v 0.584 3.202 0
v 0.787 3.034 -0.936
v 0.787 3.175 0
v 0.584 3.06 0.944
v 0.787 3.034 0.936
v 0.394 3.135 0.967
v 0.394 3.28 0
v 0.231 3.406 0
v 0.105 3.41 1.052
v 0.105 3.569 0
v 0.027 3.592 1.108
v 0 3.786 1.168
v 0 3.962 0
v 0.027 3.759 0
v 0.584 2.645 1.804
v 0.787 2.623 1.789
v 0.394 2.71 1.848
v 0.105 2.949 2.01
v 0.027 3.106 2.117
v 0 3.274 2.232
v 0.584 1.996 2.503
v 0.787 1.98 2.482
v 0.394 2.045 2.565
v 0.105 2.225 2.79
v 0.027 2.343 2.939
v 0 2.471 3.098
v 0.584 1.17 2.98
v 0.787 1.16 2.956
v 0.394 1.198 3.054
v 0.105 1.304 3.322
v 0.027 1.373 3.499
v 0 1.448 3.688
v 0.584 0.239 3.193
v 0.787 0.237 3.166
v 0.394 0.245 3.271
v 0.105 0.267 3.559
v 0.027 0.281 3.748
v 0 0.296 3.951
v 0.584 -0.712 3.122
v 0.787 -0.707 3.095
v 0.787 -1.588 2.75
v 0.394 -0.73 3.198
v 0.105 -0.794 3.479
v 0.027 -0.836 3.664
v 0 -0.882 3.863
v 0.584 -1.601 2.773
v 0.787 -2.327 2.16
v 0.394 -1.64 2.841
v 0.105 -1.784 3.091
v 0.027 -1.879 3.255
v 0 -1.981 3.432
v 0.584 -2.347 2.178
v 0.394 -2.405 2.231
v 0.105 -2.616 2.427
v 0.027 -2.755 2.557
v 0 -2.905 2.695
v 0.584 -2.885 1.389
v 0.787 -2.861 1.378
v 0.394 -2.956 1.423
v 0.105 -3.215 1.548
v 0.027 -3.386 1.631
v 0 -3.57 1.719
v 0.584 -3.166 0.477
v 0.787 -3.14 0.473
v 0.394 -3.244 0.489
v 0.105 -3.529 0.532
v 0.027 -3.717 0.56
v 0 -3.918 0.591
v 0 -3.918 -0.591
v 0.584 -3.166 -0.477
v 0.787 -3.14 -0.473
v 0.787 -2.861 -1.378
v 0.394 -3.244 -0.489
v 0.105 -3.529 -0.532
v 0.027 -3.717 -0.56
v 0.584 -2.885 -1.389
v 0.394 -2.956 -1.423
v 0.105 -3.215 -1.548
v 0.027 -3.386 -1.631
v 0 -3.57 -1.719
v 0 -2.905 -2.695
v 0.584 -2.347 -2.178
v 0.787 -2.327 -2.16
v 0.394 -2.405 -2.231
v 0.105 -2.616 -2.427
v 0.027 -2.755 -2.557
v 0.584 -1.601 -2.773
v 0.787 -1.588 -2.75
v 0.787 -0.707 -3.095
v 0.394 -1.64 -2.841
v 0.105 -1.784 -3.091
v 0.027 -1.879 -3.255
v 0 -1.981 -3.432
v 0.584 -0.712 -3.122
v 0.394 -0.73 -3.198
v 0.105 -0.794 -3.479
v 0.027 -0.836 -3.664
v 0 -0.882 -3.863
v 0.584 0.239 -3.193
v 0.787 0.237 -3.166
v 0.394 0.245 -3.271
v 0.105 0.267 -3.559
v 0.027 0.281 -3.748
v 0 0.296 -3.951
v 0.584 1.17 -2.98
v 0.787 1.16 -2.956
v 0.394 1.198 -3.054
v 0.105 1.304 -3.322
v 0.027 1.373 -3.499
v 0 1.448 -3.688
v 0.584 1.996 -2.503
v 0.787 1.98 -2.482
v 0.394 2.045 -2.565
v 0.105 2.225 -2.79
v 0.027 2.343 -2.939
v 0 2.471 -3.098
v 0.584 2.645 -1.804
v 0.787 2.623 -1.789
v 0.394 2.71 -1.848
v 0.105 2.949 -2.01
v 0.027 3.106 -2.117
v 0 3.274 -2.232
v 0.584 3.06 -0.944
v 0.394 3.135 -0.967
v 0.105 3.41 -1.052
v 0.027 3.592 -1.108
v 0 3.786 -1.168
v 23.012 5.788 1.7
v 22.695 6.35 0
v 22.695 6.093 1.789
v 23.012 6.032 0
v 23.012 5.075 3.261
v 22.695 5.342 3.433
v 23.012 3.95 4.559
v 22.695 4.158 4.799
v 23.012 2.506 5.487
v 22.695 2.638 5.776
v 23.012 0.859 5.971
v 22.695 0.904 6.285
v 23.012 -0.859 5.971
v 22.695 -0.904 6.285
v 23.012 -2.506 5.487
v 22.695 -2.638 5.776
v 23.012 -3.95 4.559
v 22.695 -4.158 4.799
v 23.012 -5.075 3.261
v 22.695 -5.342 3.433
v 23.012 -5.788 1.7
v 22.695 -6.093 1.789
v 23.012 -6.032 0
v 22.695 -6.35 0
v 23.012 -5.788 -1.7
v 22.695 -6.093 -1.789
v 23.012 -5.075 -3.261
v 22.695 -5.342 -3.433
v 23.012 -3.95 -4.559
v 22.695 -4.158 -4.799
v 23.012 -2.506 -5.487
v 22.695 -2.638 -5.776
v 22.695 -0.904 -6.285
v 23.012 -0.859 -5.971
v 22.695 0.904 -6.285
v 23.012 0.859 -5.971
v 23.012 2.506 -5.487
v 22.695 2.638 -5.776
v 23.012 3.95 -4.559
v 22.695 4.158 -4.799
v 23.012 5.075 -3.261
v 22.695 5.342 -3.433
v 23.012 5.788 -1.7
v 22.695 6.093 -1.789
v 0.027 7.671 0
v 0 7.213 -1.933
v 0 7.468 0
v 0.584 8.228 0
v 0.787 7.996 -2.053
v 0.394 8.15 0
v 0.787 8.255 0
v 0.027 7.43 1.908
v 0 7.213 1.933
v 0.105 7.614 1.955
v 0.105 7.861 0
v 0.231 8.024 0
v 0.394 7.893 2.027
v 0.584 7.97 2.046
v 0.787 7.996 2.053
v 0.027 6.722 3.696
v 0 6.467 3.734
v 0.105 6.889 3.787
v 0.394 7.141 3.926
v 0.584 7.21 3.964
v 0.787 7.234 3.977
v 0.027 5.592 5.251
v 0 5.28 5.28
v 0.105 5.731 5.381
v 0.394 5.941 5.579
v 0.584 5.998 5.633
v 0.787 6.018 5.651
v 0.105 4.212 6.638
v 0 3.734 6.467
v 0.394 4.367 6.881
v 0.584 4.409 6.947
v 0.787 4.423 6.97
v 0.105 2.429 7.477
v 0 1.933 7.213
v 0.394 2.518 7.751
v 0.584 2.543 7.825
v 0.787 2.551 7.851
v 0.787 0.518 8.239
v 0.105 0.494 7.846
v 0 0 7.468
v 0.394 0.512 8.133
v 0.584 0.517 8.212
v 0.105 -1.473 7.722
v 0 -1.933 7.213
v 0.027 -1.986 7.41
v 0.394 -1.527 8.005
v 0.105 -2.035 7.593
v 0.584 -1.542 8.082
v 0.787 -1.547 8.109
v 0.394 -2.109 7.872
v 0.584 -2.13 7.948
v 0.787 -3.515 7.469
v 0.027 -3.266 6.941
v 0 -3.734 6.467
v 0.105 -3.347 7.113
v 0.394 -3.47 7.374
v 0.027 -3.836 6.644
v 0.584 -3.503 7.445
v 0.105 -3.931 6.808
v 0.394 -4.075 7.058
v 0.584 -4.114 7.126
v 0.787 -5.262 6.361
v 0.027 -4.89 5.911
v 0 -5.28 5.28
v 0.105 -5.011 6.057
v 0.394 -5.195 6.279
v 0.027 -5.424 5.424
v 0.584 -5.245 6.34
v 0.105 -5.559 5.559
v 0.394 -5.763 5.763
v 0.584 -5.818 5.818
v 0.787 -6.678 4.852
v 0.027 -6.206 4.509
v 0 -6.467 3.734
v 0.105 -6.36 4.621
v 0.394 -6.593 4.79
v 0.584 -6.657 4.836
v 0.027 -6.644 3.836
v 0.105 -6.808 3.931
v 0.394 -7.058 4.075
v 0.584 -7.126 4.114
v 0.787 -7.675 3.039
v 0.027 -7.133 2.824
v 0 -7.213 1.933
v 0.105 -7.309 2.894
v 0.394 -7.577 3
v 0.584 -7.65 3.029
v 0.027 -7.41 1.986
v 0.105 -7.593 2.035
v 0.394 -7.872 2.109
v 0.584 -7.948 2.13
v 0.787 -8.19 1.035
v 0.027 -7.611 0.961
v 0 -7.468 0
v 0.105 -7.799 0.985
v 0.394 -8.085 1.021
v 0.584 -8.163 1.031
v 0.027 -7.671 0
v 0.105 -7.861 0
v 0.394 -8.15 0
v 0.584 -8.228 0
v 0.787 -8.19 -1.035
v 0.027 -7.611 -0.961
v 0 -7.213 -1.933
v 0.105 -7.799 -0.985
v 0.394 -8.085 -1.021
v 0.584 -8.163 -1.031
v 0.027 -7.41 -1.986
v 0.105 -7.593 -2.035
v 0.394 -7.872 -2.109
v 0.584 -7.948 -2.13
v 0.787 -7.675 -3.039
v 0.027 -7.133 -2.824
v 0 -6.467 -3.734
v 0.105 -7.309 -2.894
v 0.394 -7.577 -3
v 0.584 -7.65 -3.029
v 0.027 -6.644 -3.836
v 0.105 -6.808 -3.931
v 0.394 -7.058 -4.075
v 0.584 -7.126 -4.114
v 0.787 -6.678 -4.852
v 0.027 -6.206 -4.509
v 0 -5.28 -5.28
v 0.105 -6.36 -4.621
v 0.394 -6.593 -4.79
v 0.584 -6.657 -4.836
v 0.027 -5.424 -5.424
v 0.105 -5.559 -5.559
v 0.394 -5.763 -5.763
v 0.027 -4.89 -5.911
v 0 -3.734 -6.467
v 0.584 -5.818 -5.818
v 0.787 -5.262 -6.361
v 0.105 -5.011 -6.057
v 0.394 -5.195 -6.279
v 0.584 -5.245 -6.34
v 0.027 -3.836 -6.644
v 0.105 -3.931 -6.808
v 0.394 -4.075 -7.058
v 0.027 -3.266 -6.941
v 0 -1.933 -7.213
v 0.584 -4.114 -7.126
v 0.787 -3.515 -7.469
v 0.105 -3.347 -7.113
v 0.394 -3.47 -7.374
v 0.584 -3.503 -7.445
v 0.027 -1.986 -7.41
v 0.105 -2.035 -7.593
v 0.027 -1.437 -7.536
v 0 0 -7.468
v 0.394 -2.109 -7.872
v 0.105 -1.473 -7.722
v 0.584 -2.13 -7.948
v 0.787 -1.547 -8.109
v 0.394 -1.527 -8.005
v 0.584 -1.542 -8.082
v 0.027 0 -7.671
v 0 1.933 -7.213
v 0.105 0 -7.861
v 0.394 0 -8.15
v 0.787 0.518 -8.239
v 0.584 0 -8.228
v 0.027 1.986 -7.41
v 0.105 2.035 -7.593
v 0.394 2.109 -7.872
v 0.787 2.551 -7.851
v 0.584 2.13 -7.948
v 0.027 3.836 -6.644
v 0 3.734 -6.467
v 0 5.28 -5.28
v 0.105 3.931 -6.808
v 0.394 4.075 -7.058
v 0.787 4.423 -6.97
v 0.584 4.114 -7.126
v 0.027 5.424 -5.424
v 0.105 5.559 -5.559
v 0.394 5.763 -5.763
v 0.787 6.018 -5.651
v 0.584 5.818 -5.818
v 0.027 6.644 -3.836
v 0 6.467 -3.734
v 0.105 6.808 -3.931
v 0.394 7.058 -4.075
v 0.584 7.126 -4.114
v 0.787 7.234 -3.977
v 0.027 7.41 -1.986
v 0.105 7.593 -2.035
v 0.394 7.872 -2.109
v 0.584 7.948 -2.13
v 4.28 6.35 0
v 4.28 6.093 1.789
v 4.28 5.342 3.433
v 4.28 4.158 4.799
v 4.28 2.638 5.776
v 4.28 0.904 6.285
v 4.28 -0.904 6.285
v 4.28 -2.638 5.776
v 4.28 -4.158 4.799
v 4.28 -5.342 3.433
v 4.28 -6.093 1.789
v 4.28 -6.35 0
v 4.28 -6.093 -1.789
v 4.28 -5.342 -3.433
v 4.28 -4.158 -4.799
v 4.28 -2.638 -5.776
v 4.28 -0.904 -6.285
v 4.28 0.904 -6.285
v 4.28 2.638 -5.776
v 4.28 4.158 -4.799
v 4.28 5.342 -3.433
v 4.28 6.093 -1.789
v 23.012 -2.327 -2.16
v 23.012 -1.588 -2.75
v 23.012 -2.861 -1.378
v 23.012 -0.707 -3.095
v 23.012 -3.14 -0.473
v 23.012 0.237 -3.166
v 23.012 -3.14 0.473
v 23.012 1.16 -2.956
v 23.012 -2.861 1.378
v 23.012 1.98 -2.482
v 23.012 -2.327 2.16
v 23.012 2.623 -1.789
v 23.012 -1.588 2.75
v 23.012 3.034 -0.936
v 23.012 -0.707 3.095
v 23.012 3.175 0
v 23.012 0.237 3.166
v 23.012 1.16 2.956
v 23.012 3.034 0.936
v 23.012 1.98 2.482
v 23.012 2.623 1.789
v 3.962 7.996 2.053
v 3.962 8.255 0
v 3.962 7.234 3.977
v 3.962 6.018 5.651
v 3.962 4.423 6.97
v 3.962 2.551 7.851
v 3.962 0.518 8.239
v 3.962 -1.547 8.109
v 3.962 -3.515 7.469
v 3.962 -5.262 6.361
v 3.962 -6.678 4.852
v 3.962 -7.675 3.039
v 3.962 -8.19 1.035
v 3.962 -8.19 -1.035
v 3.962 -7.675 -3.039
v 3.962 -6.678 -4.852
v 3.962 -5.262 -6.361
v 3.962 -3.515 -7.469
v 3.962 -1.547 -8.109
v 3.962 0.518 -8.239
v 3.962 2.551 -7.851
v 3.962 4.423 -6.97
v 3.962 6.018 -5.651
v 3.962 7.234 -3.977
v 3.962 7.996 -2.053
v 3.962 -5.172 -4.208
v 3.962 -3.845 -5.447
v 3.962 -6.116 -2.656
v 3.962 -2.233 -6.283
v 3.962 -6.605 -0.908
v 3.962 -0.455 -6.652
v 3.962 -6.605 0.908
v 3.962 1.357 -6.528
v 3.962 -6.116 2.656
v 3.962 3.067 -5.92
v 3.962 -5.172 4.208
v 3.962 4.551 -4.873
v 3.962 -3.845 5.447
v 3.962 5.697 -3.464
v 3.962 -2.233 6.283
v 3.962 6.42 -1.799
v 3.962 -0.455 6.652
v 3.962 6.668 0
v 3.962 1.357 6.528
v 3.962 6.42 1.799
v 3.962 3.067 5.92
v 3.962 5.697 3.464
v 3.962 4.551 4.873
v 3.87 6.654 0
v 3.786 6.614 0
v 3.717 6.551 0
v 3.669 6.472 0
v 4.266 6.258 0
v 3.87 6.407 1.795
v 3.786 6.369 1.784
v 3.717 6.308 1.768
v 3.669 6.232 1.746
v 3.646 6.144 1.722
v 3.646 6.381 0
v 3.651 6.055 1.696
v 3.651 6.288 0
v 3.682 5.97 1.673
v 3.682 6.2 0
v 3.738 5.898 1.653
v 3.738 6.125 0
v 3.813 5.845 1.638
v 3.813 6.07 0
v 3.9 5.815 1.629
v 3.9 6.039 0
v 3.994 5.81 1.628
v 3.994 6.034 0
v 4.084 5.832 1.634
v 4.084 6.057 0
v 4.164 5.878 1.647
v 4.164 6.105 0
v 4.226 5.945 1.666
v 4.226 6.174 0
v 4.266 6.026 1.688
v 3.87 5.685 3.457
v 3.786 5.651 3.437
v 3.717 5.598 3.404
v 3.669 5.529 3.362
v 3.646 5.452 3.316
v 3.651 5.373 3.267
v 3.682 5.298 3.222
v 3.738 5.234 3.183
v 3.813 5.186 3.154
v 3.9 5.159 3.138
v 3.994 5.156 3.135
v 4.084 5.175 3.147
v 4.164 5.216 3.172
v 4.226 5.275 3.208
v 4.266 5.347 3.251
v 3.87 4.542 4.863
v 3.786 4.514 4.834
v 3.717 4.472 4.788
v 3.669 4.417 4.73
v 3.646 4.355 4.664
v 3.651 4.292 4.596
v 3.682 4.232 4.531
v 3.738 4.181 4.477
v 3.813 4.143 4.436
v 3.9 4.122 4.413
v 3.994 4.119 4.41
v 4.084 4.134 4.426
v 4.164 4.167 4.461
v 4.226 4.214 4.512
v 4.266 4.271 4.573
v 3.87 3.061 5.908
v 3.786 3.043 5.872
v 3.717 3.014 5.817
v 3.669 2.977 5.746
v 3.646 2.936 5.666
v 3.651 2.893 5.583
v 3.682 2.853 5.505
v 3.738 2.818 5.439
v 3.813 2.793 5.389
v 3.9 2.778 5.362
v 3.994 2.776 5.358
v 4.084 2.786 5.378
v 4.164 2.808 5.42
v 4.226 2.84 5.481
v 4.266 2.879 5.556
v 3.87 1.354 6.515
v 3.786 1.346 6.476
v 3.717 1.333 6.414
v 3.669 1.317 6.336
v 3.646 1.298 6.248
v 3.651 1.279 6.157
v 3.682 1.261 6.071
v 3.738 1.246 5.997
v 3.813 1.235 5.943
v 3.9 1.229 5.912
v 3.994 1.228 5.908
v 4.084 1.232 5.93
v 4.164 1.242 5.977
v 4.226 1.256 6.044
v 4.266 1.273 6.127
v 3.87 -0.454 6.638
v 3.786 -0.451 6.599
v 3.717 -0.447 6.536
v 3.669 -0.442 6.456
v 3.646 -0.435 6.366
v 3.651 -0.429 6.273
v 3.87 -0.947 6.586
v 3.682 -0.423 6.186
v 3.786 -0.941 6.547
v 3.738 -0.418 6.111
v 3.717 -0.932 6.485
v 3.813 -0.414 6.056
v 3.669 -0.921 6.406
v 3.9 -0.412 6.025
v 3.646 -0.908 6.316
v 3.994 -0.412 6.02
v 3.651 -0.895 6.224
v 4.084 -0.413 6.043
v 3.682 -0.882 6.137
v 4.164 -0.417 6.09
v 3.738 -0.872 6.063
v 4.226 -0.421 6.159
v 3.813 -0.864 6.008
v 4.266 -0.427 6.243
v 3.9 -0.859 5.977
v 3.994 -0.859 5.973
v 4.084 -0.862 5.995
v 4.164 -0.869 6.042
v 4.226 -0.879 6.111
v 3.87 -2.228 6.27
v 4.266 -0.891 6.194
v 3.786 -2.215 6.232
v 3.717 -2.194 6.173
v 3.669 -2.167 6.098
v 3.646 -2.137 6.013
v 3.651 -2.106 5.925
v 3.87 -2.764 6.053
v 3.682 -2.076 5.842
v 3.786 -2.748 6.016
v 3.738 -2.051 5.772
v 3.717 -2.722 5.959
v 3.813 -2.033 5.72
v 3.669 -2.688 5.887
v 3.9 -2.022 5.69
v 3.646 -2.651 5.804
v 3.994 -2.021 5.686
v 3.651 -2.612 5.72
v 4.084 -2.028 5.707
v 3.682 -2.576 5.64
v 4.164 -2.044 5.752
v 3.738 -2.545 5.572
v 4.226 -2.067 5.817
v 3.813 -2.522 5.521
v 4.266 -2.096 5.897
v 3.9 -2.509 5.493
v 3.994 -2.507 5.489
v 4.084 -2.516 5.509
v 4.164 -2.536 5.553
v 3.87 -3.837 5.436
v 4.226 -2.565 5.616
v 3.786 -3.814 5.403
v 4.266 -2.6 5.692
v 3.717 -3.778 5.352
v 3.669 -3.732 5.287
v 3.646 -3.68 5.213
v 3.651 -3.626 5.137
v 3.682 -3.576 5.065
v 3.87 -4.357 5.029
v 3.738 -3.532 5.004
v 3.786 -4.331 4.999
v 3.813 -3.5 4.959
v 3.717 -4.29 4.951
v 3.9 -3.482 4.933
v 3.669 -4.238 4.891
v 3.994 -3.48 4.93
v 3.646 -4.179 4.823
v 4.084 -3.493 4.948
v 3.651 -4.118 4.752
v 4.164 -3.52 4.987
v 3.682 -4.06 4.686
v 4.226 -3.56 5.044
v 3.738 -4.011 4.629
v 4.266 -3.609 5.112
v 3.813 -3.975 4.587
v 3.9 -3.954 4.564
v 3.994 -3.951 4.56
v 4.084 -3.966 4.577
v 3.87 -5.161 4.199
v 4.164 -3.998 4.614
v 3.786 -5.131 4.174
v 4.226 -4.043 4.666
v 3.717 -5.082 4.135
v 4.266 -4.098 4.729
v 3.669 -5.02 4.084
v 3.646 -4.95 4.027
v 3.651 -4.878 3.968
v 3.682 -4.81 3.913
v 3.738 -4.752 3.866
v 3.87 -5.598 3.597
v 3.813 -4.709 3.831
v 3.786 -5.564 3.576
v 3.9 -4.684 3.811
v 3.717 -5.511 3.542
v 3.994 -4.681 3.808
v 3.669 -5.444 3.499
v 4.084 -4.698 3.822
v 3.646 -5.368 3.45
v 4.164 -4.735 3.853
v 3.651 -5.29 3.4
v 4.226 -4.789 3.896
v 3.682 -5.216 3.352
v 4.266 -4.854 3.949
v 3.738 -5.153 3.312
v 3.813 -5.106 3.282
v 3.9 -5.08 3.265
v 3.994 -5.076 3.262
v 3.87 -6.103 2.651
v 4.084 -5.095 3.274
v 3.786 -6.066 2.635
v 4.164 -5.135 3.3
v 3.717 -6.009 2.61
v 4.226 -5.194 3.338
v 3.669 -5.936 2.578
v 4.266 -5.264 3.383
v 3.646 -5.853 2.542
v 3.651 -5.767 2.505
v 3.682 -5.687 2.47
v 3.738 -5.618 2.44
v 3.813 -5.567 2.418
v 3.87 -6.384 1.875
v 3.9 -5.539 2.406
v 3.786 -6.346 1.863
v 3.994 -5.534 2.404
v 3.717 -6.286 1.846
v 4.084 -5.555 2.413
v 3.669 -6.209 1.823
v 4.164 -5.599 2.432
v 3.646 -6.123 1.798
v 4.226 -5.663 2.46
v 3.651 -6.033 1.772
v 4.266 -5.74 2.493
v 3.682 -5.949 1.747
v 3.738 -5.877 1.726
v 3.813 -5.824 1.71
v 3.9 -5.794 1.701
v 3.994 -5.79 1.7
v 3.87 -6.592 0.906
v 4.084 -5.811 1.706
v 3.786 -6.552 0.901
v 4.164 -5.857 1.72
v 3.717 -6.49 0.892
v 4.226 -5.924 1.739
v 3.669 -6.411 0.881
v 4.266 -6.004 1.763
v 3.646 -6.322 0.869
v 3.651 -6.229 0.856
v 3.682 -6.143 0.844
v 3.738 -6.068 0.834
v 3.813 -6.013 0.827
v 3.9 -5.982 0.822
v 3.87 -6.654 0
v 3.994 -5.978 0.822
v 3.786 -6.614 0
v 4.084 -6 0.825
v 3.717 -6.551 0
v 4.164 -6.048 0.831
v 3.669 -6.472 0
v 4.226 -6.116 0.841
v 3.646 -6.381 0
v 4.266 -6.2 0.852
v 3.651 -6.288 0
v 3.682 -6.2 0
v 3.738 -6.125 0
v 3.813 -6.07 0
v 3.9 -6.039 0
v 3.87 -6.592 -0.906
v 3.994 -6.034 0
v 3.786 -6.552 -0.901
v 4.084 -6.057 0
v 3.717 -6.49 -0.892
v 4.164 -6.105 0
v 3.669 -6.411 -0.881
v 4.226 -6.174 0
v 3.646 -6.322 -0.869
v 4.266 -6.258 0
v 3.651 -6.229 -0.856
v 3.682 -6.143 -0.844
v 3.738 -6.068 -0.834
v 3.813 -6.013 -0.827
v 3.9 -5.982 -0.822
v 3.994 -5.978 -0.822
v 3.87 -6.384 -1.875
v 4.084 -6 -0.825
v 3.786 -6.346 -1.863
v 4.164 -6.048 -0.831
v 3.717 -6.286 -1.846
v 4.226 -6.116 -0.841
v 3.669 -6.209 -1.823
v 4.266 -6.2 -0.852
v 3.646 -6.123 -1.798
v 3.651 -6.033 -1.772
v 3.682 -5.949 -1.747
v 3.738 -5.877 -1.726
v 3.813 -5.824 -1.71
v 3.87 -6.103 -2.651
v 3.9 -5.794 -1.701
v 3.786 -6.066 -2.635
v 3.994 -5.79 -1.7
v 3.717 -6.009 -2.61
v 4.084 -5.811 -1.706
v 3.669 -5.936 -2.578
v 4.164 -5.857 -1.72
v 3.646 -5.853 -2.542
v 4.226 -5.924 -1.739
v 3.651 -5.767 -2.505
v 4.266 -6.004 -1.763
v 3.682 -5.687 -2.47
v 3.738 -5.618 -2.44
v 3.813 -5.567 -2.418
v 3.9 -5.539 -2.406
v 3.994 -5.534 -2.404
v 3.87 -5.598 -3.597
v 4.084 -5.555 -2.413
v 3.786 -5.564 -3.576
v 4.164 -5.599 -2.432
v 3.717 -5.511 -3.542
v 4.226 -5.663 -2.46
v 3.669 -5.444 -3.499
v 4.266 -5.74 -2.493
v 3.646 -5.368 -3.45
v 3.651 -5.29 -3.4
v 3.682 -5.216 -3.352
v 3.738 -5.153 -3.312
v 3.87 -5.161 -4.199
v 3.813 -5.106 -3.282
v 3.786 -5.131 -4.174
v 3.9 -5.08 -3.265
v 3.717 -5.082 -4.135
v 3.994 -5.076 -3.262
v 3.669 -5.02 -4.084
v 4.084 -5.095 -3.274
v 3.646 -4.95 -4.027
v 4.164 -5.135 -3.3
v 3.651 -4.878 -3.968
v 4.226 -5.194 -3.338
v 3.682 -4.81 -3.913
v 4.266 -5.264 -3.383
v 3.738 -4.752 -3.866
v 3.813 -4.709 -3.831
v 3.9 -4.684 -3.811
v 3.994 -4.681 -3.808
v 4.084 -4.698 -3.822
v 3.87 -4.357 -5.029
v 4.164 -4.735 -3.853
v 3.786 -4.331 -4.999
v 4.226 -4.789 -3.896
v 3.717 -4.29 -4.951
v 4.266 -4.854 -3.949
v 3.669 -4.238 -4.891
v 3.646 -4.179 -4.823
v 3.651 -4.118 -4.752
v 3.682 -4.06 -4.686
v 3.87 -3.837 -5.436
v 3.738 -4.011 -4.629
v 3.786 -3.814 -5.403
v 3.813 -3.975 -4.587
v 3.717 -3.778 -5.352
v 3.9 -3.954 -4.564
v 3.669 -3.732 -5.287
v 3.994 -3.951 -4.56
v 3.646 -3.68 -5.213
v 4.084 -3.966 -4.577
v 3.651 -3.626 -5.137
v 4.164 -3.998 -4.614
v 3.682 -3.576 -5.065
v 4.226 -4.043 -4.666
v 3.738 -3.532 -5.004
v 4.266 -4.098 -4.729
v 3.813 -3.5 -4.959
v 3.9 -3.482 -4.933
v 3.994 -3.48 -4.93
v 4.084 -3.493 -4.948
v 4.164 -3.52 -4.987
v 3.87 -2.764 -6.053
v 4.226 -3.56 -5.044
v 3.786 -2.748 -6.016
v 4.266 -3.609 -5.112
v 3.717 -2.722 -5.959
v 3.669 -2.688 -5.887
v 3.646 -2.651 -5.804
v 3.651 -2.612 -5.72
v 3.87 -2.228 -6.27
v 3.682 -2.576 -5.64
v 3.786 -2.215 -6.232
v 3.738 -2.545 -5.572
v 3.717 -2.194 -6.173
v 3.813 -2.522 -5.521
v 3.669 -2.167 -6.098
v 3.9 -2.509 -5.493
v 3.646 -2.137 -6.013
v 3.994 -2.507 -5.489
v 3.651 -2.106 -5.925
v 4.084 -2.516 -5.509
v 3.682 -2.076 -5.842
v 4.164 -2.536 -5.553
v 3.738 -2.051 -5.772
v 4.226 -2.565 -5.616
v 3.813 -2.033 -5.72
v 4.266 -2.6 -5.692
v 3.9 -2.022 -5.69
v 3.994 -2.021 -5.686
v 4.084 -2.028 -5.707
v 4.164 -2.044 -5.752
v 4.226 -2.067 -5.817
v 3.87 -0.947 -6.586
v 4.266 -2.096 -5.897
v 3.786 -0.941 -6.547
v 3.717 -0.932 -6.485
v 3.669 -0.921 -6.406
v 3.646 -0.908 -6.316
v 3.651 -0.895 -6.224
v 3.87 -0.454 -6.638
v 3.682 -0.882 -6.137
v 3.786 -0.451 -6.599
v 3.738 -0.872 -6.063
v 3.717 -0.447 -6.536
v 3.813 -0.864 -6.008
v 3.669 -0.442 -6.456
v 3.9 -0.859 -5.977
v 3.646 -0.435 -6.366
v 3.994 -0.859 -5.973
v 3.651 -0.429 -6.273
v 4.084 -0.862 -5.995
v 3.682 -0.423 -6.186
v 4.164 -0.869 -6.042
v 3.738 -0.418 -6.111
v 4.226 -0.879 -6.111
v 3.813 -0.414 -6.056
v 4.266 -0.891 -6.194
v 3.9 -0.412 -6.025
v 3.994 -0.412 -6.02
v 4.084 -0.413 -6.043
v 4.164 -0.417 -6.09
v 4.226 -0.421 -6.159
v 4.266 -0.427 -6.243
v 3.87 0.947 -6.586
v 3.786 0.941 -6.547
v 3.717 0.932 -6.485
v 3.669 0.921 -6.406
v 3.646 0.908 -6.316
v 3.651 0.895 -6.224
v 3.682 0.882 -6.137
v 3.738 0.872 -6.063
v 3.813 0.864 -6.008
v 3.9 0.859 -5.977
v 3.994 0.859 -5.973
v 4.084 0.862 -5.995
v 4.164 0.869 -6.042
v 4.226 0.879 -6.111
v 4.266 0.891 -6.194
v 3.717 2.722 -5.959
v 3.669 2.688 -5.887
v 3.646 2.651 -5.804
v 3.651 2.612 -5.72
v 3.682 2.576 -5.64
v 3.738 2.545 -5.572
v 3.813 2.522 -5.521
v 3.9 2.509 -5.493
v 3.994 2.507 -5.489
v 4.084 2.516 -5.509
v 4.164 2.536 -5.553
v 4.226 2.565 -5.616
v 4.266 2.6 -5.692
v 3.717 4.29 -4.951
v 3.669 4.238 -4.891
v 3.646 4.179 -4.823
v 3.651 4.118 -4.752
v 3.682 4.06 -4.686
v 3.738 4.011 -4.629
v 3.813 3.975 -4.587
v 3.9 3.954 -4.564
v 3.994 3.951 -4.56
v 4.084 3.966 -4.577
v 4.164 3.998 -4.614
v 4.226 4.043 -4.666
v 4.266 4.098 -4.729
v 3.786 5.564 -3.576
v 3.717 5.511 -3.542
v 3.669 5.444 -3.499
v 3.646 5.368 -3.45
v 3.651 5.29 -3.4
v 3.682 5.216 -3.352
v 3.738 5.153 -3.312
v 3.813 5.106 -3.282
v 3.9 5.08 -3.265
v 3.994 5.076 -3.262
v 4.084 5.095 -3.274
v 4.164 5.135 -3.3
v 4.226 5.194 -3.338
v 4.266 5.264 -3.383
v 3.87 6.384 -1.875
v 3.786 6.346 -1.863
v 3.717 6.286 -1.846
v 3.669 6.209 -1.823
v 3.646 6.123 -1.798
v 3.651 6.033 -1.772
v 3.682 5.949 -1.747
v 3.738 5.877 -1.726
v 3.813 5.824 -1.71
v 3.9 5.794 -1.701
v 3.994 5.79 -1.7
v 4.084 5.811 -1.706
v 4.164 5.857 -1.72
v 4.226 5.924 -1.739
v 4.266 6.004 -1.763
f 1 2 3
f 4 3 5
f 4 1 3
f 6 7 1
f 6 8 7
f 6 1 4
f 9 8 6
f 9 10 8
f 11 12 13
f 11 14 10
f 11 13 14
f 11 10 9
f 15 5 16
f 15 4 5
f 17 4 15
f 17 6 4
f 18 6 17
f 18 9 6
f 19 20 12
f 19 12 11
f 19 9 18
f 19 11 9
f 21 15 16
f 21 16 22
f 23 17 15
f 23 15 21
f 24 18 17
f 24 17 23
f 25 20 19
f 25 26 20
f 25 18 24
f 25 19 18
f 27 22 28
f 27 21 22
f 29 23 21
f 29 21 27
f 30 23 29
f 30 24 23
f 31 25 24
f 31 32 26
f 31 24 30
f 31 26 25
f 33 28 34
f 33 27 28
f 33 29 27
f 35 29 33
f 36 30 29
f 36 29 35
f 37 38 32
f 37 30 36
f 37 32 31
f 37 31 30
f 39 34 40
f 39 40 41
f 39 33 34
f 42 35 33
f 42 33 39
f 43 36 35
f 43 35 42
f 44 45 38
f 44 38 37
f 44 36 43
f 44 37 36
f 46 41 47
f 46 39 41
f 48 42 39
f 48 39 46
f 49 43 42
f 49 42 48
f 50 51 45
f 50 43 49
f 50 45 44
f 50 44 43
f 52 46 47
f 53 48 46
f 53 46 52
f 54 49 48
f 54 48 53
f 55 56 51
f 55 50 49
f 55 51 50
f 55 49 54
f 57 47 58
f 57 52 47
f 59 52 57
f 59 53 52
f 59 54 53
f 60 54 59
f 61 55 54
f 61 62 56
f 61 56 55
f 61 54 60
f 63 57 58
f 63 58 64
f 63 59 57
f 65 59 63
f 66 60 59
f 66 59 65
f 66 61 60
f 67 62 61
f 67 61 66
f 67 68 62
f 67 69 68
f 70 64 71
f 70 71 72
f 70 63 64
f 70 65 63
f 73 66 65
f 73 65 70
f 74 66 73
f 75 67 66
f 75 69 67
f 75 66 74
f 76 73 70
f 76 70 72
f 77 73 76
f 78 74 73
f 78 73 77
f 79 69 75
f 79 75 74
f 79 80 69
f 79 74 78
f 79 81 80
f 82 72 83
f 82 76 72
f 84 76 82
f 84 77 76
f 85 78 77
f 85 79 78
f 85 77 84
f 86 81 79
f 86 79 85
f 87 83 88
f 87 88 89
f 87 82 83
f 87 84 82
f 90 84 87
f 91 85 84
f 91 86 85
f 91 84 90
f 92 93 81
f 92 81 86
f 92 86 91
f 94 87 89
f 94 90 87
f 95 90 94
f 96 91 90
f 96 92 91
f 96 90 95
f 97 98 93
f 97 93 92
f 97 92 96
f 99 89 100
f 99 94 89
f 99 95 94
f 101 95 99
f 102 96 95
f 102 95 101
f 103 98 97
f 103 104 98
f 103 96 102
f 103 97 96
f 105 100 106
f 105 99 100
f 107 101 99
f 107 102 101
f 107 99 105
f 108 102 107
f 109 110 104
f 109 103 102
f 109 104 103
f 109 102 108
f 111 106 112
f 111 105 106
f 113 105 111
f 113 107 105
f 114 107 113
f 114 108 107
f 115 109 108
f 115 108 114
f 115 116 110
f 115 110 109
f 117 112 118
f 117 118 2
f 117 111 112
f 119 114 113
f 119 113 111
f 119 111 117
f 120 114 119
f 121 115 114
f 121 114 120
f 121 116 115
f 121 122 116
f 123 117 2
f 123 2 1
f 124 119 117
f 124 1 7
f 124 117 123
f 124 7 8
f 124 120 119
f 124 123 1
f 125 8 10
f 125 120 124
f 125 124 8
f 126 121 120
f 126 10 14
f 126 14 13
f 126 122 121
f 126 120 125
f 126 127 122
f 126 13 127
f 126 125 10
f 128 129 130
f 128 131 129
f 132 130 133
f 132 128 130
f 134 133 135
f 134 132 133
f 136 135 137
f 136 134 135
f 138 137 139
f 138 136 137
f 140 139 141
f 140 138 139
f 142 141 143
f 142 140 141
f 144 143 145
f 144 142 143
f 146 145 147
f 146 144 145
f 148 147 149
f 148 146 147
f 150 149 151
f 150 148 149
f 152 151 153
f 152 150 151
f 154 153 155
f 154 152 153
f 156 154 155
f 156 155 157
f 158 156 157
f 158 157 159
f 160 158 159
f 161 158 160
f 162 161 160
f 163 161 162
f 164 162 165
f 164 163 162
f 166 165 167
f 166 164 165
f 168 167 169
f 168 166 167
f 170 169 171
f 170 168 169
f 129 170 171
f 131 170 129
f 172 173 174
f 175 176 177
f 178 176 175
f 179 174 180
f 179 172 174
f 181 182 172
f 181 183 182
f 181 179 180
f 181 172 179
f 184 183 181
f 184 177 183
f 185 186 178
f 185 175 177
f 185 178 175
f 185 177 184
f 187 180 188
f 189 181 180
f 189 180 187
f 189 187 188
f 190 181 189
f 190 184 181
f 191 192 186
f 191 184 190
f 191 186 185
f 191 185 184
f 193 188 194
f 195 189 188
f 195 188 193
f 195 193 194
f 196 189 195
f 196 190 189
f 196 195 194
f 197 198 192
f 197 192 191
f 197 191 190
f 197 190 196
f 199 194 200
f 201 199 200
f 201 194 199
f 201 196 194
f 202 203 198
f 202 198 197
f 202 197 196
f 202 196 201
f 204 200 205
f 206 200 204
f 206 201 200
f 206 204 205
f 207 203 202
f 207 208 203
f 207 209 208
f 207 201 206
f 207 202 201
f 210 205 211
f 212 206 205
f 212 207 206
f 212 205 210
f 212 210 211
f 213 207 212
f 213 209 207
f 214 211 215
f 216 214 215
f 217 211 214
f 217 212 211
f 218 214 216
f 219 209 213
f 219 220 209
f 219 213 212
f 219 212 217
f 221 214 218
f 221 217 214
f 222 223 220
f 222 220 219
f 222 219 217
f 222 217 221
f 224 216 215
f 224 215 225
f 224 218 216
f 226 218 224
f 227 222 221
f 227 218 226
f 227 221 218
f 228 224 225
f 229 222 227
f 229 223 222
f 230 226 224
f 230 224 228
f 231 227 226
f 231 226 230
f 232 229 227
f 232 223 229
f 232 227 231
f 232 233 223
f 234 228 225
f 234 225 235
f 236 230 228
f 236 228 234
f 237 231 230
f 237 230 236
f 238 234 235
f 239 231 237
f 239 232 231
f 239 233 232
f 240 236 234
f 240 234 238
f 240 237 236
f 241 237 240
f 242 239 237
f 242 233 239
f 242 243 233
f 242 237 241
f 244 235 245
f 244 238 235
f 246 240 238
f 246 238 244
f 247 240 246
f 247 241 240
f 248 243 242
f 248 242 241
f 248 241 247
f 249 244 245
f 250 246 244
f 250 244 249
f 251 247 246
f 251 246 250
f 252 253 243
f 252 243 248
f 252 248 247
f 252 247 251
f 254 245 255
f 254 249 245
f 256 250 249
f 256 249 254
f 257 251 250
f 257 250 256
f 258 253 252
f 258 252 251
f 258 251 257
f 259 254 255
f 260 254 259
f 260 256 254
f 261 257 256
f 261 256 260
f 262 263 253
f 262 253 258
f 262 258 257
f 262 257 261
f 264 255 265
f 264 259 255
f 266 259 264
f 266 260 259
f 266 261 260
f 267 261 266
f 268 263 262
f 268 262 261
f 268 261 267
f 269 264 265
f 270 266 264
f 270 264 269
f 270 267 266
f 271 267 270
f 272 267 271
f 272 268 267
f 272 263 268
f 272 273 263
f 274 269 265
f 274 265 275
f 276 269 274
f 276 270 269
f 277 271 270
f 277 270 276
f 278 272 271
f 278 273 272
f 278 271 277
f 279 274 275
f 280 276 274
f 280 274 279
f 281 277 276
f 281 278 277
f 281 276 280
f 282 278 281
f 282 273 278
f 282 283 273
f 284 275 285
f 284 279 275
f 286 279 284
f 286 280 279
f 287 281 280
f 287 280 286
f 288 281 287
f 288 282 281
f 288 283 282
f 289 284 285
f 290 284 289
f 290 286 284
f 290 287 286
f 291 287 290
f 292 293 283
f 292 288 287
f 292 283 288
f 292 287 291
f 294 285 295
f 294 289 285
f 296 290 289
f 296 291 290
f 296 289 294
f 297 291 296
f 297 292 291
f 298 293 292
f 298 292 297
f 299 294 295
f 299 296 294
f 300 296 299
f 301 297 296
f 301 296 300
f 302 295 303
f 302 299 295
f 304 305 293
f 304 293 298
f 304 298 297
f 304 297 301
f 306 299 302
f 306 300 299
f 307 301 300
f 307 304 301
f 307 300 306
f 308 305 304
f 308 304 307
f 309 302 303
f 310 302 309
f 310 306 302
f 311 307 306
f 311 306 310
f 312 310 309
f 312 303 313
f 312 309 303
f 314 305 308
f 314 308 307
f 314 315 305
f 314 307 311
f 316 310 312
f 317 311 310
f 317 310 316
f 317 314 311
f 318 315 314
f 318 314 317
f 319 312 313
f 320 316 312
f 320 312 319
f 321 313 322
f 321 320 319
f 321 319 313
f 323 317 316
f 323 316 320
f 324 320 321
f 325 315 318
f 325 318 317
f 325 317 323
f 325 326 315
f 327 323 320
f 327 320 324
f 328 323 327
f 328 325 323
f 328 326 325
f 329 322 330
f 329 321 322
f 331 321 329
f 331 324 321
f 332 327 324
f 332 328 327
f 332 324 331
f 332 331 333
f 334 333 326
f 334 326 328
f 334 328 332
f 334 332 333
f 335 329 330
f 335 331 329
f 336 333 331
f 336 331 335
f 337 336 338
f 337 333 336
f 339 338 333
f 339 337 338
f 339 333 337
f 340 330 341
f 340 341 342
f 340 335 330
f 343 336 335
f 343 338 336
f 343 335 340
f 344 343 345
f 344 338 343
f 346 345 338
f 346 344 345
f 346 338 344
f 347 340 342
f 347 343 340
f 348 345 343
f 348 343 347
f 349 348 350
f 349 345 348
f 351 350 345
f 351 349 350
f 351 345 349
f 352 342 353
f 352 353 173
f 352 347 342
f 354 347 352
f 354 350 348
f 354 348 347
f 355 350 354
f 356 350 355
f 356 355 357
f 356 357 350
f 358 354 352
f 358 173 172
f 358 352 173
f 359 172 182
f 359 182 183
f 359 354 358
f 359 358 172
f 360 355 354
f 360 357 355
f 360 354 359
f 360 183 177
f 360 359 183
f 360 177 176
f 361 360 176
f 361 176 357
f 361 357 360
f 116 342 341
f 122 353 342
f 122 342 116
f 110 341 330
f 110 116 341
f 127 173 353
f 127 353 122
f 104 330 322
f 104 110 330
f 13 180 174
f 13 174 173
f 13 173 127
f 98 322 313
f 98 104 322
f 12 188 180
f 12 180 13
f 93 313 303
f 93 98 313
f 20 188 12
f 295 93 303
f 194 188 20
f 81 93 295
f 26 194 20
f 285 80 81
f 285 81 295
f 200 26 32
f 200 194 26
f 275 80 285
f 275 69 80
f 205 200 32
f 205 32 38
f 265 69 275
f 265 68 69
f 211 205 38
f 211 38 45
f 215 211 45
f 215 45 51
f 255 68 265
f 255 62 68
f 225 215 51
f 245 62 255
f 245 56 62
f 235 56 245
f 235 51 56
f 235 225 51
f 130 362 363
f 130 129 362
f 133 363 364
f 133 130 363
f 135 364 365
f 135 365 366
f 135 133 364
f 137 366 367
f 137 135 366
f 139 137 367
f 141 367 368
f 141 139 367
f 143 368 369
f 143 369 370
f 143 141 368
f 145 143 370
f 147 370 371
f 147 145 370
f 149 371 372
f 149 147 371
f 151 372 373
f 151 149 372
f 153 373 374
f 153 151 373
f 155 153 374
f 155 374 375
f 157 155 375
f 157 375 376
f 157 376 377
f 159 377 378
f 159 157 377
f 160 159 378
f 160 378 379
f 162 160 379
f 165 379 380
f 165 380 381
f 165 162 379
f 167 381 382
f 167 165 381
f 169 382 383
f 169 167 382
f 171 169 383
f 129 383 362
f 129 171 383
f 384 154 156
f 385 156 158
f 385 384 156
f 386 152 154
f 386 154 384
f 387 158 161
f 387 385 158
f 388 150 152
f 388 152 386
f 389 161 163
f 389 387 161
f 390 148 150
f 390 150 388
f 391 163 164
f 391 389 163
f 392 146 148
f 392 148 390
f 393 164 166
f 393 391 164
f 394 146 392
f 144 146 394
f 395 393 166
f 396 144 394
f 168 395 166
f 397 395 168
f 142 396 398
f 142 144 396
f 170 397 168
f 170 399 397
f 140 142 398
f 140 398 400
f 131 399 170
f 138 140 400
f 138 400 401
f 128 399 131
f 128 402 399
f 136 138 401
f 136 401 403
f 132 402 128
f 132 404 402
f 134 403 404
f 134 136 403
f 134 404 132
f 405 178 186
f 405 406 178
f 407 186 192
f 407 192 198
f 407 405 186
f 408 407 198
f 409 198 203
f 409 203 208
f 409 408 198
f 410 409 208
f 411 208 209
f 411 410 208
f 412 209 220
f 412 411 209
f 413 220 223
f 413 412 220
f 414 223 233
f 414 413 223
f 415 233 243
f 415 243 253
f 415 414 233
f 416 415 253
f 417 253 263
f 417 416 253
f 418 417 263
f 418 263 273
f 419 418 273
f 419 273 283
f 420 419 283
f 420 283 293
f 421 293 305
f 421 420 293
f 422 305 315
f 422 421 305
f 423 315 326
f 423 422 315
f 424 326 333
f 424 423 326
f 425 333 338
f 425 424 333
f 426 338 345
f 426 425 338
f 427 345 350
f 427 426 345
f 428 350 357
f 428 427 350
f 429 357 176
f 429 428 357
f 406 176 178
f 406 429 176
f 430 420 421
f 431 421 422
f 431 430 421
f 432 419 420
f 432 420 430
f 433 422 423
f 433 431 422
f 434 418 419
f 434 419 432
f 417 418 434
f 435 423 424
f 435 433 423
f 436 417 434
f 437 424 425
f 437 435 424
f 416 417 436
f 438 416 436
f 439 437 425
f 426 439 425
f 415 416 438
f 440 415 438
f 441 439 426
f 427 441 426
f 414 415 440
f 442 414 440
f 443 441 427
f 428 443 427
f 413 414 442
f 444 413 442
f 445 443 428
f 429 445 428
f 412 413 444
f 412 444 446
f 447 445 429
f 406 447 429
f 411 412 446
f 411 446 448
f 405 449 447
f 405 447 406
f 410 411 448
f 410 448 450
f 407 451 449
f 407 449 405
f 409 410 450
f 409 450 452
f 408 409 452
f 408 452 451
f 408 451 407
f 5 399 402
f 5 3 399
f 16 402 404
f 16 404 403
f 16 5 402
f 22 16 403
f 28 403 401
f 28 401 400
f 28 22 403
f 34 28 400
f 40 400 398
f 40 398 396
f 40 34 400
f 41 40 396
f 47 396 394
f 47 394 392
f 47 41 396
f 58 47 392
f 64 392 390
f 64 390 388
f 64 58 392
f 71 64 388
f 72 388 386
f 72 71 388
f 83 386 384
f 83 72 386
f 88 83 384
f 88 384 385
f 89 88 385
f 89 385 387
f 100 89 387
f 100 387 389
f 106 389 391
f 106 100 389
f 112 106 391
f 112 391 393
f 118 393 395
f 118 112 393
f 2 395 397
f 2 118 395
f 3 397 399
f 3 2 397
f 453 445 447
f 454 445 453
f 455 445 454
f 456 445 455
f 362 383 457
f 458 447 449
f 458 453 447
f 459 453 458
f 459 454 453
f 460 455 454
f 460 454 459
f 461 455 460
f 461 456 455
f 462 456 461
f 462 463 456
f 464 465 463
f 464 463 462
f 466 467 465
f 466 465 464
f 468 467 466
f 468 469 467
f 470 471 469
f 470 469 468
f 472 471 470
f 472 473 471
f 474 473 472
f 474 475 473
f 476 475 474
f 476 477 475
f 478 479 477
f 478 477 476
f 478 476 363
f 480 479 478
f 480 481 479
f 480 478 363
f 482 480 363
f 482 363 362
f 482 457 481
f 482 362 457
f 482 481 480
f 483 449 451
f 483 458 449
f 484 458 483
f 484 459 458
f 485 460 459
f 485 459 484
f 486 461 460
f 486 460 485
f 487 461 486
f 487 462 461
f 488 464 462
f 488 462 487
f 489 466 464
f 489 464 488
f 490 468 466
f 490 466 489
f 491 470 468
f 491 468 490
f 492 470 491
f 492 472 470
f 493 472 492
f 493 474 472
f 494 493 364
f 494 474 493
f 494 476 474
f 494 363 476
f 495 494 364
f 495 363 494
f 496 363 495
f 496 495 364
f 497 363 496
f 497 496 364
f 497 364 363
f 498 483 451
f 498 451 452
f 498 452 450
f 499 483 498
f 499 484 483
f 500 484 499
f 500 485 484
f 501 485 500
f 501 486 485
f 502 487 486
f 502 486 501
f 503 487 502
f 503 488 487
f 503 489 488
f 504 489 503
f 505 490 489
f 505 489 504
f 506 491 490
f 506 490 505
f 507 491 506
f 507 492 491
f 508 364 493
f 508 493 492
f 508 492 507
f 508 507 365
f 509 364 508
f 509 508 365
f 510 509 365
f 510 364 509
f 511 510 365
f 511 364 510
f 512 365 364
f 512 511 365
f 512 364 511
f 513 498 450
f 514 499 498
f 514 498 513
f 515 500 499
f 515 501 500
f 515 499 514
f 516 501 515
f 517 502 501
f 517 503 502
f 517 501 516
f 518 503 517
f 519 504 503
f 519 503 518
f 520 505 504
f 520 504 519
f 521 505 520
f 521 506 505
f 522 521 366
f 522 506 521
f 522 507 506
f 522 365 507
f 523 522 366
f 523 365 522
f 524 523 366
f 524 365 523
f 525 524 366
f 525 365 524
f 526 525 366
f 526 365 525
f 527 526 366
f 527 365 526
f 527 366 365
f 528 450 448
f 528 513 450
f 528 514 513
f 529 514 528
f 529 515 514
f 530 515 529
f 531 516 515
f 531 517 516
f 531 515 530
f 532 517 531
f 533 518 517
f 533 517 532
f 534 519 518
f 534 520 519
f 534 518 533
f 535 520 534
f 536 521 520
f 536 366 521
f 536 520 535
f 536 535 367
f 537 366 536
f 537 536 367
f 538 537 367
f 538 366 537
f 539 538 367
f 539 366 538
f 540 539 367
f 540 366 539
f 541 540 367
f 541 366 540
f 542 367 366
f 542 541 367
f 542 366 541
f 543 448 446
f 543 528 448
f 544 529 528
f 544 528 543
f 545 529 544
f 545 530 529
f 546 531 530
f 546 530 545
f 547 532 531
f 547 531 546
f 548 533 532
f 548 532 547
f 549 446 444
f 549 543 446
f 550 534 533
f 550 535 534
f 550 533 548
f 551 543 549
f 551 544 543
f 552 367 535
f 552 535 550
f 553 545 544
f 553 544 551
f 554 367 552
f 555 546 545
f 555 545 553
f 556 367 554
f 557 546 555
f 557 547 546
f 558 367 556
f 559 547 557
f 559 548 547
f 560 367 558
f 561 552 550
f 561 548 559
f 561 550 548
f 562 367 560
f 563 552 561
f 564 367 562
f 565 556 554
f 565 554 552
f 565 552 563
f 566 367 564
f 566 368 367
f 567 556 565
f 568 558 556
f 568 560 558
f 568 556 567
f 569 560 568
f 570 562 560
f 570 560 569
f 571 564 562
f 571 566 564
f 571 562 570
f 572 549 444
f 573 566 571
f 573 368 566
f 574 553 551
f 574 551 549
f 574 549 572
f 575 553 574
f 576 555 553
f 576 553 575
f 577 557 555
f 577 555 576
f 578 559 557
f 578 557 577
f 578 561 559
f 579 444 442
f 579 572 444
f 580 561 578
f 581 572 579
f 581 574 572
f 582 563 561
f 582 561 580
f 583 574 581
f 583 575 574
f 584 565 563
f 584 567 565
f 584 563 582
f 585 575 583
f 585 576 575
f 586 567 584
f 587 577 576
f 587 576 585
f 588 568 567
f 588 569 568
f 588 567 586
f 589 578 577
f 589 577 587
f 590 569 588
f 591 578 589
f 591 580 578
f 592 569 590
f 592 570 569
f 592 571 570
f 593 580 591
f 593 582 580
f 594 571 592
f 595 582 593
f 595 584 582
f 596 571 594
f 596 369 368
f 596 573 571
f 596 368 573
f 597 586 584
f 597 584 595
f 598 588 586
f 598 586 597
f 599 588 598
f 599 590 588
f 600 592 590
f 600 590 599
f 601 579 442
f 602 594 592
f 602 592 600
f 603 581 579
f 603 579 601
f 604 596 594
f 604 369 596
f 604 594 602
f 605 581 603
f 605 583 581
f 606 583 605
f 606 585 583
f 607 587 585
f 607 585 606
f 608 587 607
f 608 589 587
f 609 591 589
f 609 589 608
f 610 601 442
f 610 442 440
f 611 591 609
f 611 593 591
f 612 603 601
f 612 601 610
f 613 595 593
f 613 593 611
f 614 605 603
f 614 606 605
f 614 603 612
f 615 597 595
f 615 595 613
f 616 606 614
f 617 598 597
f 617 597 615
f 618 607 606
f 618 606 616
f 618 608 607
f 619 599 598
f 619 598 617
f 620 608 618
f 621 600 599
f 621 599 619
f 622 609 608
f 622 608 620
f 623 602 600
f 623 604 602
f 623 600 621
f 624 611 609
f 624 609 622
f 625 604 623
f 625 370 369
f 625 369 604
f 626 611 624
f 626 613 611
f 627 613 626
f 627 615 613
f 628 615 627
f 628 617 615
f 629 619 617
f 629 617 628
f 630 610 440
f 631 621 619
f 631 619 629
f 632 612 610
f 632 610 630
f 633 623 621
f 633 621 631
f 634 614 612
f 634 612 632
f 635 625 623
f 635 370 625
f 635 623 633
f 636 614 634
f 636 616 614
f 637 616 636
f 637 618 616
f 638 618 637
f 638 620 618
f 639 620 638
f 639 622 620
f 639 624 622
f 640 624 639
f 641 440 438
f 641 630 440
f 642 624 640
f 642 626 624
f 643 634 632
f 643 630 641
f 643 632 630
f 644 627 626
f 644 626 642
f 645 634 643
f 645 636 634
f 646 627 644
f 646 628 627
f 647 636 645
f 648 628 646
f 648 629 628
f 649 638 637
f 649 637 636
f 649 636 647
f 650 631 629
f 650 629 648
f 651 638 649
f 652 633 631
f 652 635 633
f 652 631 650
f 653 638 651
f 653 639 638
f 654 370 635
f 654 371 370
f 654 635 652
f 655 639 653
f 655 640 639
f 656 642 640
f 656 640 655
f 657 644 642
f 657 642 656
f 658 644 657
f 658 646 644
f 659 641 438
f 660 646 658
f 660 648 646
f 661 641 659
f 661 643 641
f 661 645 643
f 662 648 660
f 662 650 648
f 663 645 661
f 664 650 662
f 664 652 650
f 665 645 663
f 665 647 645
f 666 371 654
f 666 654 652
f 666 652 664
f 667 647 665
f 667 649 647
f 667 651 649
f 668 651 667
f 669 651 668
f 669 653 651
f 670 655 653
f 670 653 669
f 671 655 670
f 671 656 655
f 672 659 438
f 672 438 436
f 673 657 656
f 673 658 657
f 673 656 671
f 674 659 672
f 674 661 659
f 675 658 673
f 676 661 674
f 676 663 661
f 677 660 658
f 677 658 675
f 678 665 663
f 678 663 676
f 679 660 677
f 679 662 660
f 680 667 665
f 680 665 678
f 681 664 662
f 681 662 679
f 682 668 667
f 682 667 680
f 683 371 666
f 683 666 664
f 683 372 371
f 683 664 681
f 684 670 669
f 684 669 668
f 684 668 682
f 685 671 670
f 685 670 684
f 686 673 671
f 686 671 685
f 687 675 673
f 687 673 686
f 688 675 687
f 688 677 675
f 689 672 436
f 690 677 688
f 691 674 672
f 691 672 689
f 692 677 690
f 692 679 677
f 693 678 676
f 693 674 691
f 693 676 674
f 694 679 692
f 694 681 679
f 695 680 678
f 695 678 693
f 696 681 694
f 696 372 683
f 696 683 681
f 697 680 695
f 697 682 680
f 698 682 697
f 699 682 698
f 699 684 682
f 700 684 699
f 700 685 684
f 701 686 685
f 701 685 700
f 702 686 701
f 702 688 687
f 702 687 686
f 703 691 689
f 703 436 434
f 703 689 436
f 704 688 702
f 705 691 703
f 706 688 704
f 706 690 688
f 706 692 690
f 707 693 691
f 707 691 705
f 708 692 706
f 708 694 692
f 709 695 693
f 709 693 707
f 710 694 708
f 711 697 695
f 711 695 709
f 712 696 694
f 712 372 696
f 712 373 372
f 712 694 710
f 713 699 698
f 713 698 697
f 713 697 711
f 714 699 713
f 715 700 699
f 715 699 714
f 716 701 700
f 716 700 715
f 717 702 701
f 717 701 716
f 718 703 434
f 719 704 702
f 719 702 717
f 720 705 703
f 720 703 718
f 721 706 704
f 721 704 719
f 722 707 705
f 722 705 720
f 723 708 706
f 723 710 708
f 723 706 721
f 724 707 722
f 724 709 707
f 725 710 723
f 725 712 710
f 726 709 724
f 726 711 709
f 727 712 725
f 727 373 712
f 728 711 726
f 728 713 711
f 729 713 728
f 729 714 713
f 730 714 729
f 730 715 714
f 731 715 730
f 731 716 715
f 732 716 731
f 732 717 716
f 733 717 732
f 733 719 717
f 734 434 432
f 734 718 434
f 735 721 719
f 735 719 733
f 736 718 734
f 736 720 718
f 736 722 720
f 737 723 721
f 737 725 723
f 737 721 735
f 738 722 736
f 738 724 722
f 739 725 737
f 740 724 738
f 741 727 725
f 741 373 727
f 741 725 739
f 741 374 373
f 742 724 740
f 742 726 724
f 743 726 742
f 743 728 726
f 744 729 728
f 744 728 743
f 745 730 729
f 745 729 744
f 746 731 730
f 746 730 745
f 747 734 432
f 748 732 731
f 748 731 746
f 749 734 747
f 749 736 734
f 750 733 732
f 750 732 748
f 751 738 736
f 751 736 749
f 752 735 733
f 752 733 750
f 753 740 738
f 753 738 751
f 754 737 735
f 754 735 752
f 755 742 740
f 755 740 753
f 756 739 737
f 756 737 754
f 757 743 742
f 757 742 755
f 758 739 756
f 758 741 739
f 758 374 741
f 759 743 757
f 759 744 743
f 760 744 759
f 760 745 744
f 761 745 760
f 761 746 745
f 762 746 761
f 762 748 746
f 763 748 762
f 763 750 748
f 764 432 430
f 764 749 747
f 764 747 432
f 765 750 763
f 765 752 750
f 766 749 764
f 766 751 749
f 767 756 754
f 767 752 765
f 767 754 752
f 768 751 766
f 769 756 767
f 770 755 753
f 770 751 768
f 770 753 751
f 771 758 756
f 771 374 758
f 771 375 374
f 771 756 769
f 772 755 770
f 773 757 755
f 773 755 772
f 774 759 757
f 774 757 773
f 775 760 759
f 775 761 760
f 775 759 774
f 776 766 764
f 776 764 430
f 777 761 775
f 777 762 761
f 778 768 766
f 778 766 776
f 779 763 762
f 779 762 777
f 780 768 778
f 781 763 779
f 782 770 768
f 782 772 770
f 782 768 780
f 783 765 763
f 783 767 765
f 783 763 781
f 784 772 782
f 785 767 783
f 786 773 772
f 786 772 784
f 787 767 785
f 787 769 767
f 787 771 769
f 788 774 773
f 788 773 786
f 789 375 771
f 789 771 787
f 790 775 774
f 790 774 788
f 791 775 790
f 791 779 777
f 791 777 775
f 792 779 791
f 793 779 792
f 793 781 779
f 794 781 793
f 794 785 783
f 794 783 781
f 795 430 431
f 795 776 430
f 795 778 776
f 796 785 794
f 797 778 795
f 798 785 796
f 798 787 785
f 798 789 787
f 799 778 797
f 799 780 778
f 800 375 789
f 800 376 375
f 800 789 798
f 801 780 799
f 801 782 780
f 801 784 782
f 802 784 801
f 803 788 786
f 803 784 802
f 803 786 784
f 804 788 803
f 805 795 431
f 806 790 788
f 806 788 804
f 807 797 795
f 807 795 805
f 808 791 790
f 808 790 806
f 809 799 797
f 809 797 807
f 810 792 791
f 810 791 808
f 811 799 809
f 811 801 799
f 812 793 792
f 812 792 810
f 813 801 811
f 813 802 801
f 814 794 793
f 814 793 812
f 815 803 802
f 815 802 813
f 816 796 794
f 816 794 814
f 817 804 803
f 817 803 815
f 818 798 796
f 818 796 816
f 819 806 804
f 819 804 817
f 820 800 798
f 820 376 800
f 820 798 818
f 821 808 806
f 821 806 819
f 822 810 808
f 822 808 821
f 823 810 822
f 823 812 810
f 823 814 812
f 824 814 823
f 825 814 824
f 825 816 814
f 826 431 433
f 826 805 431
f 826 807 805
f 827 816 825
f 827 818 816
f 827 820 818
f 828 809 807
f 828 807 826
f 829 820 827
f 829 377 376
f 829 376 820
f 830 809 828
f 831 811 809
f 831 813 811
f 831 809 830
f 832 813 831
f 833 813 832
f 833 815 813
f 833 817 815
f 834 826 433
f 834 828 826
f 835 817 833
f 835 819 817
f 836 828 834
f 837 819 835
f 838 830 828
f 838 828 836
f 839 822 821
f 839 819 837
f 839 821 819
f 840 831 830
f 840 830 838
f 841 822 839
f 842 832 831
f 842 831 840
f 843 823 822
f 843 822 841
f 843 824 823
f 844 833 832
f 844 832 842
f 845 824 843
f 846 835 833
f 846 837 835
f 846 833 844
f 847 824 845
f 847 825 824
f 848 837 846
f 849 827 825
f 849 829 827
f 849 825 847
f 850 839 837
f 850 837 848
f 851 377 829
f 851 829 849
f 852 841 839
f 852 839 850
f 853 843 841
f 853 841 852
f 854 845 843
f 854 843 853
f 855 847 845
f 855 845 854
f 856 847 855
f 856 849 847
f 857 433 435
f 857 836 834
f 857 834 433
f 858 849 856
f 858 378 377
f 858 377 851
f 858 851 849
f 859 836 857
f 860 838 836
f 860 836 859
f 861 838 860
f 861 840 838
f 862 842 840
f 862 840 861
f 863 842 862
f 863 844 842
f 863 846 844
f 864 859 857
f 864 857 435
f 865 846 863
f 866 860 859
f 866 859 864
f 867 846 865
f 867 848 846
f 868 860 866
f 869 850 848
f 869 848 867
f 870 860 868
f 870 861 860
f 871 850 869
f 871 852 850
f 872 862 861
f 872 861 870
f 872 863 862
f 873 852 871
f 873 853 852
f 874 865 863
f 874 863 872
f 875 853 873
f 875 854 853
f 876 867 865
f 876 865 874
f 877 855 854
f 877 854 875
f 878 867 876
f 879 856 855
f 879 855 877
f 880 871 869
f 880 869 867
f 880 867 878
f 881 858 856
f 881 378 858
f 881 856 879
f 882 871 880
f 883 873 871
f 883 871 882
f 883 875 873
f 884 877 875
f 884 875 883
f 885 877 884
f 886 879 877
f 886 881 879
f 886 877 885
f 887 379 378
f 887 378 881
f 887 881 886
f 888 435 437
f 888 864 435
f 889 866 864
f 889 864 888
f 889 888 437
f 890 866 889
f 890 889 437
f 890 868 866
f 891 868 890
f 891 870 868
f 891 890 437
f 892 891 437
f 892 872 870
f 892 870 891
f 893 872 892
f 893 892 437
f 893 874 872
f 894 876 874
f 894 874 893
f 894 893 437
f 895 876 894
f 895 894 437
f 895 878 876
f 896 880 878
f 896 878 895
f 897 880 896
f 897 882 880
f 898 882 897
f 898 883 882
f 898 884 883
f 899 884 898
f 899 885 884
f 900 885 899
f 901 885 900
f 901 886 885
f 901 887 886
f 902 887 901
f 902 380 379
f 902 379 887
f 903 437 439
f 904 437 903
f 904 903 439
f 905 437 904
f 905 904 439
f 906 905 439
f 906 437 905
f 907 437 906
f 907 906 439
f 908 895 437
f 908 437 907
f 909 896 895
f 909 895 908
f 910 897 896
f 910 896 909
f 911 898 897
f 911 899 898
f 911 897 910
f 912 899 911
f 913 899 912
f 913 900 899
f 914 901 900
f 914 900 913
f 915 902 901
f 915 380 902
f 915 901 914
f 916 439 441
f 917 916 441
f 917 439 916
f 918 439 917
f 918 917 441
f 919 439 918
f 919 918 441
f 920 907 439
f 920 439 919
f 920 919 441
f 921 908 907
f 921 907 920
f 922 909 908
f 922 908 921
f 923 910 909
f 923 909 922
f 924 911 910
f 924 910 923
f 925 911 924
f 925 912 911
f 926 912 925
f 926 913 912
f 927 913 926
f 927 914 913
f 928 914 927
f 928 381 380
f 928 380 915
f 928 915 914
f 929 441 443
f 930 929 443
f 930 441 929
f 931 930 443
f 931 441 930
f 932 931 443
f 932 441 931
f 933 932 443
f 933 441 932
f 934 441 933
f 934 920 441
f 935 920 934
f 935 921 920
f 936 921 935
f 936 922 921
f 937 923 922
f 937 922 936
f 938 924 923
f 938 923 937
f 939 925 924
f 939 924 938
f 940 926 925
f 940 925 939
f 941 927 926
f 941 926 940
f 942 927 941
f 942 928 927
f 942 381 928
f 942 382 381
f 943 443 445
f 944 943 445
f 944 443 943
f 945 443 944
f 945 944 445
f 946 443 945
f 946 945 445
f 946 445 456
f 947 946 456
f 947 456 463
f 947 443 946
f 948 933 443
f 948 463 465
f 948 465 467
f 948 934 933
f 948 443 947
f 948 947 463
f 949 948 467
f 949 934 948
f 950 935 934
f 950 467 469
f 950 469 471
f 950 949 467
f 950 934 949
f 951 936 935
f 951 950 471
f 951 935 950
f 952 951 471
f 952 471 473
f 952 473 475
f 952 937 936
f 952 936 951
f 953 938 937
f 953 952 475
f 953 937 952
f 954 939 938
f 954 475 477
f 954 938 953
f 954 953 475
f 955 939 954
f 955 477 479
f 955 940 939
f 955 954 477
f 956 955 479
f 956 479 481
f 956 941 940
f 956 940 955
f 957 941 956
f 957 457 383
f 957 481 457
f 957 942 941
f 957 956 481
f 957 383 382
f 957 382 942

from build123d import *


with BuildPart() as part:
    # Sketch1 → BaseBody (revolve)
    with BuildSketch(Plane.XY):
        with BuildLine():
            Line((0, 3.9624), (0, 7.4676))
            ThreePointArc((0, 7.4676), (0.23062412, 8.02437588), (0.7874, 8.255))
            Line((0.7874, 8.255), (3.9624, 8.255))
            Line((3.9624, 8.255), (3.9624, 6.6675))
            ThreePointArc((3.9624, 6.6675), (3.737893597, 6.125493597), (4.2799, 6.35))
            Line((4.2799, 6.35), (22.6949, 6.35))
            Line((22.6949, 6.35), (23.0124, 6.0325))
            Line((23.0124, 6.0325), (23.0124, 3.175))
            Line((23.0124, 3.175), (0.7874, 3.175))
            ThreePointArc((0.7874, 3.175), (0.23062412, 3.40562412), (0, 3.9624))
        make_face()
    revolve(axis=Axis((0, 0, 0), (1, 0, 0)))


solid = part.part
